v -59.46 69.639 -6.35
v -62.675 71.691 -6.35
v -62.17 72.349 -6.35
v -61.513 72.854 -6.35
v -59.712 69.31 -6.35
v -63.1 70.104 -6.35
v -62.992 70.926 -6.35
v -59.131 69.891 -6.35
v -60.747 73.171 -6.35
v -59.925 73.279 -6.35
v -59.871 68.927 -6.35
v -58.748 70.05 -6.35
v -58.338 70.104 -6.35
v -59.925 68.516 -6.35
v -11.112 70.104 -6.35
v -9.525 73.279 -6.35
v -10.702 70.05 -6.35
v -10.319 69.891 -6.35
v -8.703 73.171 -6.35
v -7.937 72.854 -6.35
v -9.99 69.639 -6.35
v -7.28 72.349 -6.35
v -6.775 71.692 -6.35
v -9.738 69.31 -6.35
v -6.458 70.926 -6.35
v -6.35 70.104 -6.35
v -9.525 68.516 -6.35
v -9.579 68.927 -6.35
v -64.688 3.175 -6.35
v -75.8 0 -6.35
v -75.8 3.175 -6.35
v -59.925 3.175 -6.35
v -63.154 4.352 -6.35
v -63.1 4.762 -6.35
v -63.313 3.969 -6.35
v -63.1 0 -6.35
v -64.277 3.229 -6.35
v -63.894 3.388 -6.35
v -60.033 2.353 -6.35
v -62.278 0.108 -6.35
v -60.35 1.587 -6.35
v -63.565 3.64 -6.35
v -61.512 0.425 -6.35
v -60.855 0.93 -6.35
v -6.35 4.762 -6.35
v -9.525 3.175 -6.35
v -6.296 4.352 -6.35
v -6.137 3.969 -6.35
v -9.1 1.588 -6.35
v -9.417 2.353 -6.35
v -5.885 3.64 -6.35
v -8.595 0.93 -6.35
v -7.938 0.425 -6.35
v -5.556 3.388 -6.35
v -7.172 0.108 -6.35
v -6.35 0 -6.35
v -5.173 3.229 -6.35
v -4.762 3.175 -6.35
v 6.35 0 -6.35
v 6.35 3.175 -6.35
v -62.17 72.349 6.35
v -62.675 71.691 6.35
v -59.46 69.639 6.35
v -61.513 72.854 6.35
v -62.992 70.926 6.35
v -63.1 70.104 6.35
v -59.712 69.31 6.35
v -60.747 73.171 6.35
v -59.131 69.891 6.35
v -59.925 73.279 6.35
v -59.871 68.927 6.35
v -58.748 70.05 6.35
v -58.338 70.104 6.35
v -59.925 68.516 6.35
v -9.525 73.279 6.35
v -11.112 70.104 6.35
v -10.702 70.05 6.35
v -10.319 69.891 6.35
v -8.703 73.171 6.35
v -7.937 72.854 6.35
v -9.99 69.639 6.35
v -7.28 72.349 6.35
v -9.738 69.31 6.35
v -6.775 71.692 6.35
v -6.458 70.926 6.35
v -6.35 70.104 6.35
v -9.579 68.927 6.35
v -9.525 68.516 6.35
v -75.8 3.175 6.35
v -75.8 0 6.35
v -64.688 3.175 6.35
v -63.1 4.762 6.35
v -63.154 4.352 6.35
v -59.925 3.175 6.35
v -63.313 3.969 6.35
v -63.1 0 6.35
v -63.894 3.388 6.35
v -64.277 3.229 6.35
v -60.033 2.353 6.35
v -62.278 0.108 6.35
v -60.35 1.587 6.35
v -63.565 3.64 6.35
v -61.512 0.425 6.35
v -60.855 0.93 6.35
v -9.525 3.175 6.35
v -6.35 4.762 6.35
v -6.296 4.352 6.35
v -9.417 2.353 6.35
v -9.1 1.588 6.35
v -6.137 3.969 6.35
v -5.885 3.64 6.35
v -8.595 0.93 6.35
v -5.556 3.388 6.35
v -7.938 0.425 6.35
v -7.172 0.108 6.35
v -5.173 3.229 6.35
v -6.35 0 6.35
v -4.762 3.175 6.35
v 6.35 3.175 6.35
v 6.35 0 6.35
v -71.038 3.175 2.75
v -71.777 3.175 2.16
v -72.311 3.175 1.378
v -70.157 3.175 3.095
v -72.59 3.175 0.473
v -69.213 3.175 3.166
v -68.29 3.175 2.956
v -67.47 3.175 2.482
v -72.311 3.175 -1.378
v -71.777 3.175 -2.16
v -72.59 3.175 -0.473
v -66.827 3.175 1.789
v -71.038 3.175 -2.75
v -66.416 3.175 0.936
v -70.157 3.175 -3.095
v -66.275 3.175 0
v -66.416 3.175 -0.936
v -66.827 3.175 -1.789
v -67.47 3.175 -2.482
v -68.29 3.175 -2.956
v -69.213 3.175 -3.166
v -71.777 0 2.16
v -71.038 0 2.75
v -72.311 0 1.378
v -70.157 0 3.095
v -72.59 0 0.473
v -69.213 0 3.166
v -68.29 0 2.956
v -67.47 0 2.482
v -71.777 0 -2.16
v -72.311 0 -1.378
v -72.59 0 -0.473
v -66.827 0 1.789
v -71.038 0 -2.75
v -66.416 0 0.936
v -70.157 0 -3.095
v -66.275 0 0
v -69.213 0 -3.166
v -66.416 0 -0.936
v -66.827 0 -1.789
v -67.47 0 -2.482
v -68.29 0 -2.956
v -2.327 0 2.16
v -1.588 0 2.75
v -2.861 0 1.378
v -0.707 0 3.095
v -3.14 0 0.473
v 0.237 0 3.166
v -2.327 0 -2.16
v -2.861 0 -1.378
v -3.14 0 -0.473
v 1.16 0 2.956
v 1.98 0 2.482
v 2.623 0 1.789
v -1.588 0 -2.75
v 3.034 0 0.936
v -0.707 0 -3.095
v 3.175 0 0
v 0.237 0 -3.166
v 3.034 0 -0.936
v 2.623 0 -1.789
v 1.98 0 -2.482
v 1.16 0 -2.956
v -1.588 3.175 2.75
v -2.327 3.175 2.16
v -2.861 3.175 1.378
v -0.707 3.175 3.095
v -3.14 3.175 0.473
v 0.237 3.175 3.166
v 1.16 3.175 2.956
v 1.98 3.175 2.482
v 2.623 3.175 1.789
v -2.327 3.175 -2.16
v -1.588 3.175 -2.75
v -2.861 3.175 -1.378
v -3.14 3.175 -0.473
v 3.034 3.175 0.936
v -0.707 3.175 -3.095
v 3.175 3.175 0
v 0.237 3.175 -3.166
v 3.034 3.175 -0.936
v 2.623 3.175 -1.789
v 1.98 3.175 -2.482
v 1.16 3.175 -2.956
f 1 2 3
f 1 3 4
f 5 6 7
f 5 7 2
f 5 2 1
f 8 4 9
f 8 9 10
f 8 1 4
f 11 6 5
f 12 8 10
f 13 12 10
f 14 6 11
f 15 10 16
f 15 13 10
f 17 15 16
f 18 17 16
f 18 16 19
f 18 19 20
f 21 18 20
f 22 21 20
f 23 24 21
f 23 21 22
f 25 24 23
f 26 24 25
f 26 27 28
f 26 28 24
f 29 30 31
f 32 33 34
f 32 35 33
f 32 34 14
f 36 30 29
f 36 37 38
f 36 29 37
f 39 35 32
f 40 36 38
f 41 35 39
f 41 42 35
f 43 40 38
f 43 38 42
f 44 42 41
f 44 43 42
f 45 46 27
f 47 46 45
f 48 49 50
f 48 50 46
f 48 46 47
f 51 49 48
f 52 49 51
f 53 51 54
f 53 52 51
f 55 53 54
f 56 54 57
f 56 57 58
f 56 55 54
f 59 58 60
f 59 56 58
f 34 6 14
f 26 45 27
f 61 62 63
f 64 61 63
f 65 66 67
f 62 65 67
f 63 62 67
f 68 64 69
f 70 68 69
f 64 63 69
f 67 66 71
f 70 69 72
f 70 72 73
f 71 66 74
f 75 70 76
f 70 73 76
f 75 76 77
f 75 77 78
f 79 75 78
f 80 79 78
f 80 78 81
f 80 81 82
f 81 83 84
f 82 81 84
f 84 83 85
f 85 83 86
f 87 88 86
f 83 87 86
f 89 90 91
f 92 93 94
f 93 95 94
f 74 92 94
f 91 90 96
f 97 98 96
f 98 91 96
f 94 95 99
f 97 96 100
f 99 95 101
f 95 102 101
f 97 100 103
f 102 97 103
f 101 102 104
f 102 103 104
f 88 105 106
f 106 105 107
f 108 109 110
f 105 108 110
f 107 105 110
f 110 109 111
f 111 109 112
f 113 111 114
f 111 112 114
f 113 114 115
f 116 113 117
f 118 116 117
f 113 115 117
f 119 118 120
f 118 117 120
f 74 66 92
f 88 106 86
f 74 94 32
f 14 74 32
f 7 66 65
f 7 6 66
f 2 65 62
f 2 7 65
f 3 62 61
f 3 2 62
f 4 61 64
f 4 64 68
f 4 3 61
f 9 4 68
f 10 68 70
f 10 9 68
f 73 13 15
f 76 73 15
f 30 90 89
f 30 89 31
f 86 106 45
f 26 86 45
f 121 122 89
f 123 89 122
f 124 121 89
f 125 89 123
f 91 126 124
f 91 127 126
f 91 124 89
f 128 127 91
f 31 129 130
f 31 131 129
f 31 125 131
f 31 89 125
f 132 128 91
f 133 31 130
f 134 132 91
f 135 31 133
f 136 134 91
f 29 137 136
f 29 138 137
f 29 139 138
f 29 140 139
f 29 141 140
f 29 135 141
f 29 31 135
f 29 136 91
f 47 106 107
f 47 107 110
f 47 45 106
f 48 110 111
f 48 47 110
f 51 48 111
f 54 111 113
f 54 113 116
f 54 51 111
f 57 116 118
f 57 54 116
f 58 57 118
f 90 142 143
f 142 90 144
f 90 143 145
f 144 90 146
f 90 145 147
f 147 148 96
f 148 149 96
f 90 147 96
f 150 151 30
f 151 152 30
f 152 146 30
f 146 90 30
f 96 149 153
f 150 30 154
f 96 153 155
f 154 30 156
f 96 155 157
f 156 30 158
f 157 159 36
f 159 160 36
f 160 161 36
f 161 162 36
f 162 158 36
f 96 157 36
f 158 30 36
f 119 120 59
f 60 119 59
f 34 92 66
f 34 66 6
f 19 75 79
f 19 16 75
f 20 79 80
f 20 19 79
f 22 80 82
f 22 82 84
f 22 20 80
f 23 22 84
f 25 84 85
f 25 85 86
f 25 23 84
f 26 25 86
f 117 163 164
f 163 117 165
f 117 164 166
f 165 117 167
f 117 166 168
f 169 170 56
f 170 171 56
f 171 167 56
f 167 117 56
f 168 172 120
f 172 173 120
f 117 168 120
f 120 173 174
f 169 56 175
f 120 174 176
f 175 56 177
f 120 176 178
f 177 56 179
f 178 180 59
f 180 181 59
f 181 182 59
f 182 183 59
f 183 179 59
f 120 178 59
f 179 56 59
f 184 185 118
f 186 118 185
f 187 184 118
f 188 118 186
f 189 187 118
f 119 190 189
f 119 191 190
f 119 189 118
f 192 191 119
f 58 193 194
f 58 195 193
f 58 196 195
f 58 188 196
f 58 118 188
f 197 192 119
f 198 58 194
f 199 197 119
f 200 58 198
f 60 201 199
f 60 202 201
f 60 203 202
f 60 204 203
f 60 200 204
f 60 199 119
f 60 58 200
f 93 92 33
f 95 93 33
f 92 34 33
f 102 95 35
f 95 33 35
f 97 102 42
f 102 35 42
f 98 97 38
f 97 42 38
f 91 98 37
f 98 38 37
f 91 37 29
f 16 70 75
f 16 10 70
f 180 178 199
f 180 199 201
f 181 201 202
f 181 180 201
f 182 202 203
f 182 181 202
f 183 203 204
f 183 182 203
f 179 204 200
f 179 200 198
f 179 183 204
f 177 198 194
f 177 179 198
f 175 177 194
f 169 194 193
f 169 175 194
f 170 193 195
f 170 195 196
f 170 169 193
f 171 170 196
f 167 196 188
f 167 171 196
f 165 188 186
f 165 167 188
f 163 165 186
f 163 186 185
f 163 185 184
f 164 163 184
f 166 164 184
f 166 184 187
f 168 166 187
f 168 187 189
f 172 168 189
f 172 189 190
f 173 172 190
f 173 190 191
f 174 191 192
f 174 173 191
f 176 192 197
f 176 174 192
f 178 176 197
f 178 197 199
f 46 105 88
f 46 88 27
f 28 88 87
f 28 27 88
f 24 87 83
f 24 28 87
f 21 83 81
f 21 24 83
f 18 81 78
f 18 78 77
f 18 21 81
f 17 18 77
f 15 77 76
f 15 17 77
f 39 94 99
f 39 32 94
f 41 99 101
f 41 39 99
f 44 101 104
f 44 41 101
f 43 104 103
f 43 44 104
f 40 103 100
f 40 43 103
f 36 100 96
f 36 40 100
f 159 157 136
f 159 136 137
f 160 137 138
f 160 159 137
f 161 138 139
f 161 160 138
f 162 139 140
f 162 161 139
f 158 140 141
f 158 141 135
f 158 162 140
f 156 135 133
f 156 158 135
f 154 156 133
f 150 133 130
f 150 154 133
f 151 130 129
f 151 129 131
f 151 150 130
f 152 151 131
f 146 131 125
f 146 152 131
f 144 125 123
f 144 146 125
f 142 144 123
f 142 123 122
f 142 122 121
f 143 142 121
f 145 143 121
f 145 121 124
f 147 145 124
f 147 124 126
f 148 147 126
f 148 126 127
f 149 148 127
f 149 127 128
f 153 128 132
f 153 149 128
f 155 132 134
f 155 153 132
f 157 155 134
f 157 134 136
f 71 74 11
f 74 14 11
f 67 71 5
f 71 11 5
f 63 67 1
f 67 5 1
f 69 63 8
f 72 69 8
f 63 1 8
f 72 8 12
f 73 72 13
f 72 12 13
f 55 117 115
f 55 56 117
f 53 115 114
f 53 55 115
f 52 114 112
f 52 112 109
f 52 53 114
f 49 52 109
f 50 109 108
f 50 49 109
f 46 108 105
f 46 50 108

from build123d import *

# Parameters (mm, degrees)
SKETCH1_W             = 15.875
SKETCH1_H             = 12.7
SKETCH1_R             = 3.175
BOSS_EXTRUDE1_DEPTH   = 3.175
BOSS_EXTRUDE1_2_DEPTH = 3.175
SKETCH2_W             = 3.175
SKETCH2_H             = 12.7
BOSS_EXTRUDE2_DEPTH   = 70.104
SKETCH3_W             = 3.175
SKETCH3_H             = 12.7
SKETCH3_W_2           = 53.575
BOSS_EXTRUDE3_DEPTH   = 3.175
FILLET5_R             = 3.175
FILLET6_R             = 1.5875


with BuildPart() as part:
    # Sketch1 → Boss-Extrude1 (new body)
    with BuildSketch(Plane(origin=(0, 0, 0), x_dir=(1, 0, 0), z_dir=(0, 1, 0))):
        with Locations((-1.5875, 0)):
            Rectangle(SKETCH1_W, SKETCH1_H)
        Circle(SKETCH1_R, mode=Mode.SUBTRACT)
    extrude(amount=BOSS_EXTRUDE1_DEPTH)



with BuildPart() as body_2:
    # Sketch1 → Boss-Extrude1 2 (new body)
    with BuildSketch(Plane(origin=(0, 0, 0), x_dir=(1, 0, 0), z_dir=(0, 1, 0))):
        with Locations((-67.8625, 0)):
            Rectangle(SKETCH1_W, SKETCH1_H)
        with Locations((-69.45, 0)):
            Circle(SKETCH1_R, mode=Mode.SUBTRACT)
    extrude(amount=BOSS_EXTRUDE1_2_DEPTH)


with BuildPart() as part_1:
    add(part.part)

    add(body_2.part)  # Boss-Extrude2 merges body 2
    # Sketch2 → Boss-Extrude2 (add)
    with BuildSketch(Plane(origin=(0, 3.175, 0), x_dir=(1, 0, 0), z_dir=(0, 1, 0))):
        with Locations((-61.5125, 0)):
            Rectangle(SKETCH2_W, SKETCH2_H)
        with Locations((-7.9375, 0)):
            Rectangle(SKETCH2_W, SKETCH2_H)
    extrude(amount=BOSS_EXTRUDE2_DEPTH)

    # Sketch3 → Boss-Extrude3 (add)
    with BuildSketch(Plane(origin=(0, 73.279, 0), x_dir=(1, 0, 0), z_dir=(0, 1, 0))):
        with Locations((-61.5125, 0)):
            Rectangle(SKETCH3_W, SKETCH3_H)
        with Locations((-33.1375, 0)):
            Rectangle(SKETCH3_W_2, SKETCH3_H)
    extrude(amount=-BOSS_EXTRUDE3_DEPTH)

    # Fillet5
    fillet5_edges = [part_1.edges().sort_by_distance(p)[0] for p in [
        (-63.1, 73.279, 0),
        (-6.35, 73.279, 0),
        (-9.525, 0, 0),
        (-59.925, 0, 0),
    ]]
    fillet(fillet5_edges, radius=FILLET5_R)

    # Fillet6
    fillet6_edges = [part_1.edges().sort_by_distance(p)[0] for p in [
        (-63.1, 3.175, 0),
        (-59.925, 70.104, 0),
        (-9.525, 70.104, 0),
        (-6.35, 3.175, 0),
    ]]
    fillet(fillet6_edges, radius=FILLET6_R)


solid = part_1.part
